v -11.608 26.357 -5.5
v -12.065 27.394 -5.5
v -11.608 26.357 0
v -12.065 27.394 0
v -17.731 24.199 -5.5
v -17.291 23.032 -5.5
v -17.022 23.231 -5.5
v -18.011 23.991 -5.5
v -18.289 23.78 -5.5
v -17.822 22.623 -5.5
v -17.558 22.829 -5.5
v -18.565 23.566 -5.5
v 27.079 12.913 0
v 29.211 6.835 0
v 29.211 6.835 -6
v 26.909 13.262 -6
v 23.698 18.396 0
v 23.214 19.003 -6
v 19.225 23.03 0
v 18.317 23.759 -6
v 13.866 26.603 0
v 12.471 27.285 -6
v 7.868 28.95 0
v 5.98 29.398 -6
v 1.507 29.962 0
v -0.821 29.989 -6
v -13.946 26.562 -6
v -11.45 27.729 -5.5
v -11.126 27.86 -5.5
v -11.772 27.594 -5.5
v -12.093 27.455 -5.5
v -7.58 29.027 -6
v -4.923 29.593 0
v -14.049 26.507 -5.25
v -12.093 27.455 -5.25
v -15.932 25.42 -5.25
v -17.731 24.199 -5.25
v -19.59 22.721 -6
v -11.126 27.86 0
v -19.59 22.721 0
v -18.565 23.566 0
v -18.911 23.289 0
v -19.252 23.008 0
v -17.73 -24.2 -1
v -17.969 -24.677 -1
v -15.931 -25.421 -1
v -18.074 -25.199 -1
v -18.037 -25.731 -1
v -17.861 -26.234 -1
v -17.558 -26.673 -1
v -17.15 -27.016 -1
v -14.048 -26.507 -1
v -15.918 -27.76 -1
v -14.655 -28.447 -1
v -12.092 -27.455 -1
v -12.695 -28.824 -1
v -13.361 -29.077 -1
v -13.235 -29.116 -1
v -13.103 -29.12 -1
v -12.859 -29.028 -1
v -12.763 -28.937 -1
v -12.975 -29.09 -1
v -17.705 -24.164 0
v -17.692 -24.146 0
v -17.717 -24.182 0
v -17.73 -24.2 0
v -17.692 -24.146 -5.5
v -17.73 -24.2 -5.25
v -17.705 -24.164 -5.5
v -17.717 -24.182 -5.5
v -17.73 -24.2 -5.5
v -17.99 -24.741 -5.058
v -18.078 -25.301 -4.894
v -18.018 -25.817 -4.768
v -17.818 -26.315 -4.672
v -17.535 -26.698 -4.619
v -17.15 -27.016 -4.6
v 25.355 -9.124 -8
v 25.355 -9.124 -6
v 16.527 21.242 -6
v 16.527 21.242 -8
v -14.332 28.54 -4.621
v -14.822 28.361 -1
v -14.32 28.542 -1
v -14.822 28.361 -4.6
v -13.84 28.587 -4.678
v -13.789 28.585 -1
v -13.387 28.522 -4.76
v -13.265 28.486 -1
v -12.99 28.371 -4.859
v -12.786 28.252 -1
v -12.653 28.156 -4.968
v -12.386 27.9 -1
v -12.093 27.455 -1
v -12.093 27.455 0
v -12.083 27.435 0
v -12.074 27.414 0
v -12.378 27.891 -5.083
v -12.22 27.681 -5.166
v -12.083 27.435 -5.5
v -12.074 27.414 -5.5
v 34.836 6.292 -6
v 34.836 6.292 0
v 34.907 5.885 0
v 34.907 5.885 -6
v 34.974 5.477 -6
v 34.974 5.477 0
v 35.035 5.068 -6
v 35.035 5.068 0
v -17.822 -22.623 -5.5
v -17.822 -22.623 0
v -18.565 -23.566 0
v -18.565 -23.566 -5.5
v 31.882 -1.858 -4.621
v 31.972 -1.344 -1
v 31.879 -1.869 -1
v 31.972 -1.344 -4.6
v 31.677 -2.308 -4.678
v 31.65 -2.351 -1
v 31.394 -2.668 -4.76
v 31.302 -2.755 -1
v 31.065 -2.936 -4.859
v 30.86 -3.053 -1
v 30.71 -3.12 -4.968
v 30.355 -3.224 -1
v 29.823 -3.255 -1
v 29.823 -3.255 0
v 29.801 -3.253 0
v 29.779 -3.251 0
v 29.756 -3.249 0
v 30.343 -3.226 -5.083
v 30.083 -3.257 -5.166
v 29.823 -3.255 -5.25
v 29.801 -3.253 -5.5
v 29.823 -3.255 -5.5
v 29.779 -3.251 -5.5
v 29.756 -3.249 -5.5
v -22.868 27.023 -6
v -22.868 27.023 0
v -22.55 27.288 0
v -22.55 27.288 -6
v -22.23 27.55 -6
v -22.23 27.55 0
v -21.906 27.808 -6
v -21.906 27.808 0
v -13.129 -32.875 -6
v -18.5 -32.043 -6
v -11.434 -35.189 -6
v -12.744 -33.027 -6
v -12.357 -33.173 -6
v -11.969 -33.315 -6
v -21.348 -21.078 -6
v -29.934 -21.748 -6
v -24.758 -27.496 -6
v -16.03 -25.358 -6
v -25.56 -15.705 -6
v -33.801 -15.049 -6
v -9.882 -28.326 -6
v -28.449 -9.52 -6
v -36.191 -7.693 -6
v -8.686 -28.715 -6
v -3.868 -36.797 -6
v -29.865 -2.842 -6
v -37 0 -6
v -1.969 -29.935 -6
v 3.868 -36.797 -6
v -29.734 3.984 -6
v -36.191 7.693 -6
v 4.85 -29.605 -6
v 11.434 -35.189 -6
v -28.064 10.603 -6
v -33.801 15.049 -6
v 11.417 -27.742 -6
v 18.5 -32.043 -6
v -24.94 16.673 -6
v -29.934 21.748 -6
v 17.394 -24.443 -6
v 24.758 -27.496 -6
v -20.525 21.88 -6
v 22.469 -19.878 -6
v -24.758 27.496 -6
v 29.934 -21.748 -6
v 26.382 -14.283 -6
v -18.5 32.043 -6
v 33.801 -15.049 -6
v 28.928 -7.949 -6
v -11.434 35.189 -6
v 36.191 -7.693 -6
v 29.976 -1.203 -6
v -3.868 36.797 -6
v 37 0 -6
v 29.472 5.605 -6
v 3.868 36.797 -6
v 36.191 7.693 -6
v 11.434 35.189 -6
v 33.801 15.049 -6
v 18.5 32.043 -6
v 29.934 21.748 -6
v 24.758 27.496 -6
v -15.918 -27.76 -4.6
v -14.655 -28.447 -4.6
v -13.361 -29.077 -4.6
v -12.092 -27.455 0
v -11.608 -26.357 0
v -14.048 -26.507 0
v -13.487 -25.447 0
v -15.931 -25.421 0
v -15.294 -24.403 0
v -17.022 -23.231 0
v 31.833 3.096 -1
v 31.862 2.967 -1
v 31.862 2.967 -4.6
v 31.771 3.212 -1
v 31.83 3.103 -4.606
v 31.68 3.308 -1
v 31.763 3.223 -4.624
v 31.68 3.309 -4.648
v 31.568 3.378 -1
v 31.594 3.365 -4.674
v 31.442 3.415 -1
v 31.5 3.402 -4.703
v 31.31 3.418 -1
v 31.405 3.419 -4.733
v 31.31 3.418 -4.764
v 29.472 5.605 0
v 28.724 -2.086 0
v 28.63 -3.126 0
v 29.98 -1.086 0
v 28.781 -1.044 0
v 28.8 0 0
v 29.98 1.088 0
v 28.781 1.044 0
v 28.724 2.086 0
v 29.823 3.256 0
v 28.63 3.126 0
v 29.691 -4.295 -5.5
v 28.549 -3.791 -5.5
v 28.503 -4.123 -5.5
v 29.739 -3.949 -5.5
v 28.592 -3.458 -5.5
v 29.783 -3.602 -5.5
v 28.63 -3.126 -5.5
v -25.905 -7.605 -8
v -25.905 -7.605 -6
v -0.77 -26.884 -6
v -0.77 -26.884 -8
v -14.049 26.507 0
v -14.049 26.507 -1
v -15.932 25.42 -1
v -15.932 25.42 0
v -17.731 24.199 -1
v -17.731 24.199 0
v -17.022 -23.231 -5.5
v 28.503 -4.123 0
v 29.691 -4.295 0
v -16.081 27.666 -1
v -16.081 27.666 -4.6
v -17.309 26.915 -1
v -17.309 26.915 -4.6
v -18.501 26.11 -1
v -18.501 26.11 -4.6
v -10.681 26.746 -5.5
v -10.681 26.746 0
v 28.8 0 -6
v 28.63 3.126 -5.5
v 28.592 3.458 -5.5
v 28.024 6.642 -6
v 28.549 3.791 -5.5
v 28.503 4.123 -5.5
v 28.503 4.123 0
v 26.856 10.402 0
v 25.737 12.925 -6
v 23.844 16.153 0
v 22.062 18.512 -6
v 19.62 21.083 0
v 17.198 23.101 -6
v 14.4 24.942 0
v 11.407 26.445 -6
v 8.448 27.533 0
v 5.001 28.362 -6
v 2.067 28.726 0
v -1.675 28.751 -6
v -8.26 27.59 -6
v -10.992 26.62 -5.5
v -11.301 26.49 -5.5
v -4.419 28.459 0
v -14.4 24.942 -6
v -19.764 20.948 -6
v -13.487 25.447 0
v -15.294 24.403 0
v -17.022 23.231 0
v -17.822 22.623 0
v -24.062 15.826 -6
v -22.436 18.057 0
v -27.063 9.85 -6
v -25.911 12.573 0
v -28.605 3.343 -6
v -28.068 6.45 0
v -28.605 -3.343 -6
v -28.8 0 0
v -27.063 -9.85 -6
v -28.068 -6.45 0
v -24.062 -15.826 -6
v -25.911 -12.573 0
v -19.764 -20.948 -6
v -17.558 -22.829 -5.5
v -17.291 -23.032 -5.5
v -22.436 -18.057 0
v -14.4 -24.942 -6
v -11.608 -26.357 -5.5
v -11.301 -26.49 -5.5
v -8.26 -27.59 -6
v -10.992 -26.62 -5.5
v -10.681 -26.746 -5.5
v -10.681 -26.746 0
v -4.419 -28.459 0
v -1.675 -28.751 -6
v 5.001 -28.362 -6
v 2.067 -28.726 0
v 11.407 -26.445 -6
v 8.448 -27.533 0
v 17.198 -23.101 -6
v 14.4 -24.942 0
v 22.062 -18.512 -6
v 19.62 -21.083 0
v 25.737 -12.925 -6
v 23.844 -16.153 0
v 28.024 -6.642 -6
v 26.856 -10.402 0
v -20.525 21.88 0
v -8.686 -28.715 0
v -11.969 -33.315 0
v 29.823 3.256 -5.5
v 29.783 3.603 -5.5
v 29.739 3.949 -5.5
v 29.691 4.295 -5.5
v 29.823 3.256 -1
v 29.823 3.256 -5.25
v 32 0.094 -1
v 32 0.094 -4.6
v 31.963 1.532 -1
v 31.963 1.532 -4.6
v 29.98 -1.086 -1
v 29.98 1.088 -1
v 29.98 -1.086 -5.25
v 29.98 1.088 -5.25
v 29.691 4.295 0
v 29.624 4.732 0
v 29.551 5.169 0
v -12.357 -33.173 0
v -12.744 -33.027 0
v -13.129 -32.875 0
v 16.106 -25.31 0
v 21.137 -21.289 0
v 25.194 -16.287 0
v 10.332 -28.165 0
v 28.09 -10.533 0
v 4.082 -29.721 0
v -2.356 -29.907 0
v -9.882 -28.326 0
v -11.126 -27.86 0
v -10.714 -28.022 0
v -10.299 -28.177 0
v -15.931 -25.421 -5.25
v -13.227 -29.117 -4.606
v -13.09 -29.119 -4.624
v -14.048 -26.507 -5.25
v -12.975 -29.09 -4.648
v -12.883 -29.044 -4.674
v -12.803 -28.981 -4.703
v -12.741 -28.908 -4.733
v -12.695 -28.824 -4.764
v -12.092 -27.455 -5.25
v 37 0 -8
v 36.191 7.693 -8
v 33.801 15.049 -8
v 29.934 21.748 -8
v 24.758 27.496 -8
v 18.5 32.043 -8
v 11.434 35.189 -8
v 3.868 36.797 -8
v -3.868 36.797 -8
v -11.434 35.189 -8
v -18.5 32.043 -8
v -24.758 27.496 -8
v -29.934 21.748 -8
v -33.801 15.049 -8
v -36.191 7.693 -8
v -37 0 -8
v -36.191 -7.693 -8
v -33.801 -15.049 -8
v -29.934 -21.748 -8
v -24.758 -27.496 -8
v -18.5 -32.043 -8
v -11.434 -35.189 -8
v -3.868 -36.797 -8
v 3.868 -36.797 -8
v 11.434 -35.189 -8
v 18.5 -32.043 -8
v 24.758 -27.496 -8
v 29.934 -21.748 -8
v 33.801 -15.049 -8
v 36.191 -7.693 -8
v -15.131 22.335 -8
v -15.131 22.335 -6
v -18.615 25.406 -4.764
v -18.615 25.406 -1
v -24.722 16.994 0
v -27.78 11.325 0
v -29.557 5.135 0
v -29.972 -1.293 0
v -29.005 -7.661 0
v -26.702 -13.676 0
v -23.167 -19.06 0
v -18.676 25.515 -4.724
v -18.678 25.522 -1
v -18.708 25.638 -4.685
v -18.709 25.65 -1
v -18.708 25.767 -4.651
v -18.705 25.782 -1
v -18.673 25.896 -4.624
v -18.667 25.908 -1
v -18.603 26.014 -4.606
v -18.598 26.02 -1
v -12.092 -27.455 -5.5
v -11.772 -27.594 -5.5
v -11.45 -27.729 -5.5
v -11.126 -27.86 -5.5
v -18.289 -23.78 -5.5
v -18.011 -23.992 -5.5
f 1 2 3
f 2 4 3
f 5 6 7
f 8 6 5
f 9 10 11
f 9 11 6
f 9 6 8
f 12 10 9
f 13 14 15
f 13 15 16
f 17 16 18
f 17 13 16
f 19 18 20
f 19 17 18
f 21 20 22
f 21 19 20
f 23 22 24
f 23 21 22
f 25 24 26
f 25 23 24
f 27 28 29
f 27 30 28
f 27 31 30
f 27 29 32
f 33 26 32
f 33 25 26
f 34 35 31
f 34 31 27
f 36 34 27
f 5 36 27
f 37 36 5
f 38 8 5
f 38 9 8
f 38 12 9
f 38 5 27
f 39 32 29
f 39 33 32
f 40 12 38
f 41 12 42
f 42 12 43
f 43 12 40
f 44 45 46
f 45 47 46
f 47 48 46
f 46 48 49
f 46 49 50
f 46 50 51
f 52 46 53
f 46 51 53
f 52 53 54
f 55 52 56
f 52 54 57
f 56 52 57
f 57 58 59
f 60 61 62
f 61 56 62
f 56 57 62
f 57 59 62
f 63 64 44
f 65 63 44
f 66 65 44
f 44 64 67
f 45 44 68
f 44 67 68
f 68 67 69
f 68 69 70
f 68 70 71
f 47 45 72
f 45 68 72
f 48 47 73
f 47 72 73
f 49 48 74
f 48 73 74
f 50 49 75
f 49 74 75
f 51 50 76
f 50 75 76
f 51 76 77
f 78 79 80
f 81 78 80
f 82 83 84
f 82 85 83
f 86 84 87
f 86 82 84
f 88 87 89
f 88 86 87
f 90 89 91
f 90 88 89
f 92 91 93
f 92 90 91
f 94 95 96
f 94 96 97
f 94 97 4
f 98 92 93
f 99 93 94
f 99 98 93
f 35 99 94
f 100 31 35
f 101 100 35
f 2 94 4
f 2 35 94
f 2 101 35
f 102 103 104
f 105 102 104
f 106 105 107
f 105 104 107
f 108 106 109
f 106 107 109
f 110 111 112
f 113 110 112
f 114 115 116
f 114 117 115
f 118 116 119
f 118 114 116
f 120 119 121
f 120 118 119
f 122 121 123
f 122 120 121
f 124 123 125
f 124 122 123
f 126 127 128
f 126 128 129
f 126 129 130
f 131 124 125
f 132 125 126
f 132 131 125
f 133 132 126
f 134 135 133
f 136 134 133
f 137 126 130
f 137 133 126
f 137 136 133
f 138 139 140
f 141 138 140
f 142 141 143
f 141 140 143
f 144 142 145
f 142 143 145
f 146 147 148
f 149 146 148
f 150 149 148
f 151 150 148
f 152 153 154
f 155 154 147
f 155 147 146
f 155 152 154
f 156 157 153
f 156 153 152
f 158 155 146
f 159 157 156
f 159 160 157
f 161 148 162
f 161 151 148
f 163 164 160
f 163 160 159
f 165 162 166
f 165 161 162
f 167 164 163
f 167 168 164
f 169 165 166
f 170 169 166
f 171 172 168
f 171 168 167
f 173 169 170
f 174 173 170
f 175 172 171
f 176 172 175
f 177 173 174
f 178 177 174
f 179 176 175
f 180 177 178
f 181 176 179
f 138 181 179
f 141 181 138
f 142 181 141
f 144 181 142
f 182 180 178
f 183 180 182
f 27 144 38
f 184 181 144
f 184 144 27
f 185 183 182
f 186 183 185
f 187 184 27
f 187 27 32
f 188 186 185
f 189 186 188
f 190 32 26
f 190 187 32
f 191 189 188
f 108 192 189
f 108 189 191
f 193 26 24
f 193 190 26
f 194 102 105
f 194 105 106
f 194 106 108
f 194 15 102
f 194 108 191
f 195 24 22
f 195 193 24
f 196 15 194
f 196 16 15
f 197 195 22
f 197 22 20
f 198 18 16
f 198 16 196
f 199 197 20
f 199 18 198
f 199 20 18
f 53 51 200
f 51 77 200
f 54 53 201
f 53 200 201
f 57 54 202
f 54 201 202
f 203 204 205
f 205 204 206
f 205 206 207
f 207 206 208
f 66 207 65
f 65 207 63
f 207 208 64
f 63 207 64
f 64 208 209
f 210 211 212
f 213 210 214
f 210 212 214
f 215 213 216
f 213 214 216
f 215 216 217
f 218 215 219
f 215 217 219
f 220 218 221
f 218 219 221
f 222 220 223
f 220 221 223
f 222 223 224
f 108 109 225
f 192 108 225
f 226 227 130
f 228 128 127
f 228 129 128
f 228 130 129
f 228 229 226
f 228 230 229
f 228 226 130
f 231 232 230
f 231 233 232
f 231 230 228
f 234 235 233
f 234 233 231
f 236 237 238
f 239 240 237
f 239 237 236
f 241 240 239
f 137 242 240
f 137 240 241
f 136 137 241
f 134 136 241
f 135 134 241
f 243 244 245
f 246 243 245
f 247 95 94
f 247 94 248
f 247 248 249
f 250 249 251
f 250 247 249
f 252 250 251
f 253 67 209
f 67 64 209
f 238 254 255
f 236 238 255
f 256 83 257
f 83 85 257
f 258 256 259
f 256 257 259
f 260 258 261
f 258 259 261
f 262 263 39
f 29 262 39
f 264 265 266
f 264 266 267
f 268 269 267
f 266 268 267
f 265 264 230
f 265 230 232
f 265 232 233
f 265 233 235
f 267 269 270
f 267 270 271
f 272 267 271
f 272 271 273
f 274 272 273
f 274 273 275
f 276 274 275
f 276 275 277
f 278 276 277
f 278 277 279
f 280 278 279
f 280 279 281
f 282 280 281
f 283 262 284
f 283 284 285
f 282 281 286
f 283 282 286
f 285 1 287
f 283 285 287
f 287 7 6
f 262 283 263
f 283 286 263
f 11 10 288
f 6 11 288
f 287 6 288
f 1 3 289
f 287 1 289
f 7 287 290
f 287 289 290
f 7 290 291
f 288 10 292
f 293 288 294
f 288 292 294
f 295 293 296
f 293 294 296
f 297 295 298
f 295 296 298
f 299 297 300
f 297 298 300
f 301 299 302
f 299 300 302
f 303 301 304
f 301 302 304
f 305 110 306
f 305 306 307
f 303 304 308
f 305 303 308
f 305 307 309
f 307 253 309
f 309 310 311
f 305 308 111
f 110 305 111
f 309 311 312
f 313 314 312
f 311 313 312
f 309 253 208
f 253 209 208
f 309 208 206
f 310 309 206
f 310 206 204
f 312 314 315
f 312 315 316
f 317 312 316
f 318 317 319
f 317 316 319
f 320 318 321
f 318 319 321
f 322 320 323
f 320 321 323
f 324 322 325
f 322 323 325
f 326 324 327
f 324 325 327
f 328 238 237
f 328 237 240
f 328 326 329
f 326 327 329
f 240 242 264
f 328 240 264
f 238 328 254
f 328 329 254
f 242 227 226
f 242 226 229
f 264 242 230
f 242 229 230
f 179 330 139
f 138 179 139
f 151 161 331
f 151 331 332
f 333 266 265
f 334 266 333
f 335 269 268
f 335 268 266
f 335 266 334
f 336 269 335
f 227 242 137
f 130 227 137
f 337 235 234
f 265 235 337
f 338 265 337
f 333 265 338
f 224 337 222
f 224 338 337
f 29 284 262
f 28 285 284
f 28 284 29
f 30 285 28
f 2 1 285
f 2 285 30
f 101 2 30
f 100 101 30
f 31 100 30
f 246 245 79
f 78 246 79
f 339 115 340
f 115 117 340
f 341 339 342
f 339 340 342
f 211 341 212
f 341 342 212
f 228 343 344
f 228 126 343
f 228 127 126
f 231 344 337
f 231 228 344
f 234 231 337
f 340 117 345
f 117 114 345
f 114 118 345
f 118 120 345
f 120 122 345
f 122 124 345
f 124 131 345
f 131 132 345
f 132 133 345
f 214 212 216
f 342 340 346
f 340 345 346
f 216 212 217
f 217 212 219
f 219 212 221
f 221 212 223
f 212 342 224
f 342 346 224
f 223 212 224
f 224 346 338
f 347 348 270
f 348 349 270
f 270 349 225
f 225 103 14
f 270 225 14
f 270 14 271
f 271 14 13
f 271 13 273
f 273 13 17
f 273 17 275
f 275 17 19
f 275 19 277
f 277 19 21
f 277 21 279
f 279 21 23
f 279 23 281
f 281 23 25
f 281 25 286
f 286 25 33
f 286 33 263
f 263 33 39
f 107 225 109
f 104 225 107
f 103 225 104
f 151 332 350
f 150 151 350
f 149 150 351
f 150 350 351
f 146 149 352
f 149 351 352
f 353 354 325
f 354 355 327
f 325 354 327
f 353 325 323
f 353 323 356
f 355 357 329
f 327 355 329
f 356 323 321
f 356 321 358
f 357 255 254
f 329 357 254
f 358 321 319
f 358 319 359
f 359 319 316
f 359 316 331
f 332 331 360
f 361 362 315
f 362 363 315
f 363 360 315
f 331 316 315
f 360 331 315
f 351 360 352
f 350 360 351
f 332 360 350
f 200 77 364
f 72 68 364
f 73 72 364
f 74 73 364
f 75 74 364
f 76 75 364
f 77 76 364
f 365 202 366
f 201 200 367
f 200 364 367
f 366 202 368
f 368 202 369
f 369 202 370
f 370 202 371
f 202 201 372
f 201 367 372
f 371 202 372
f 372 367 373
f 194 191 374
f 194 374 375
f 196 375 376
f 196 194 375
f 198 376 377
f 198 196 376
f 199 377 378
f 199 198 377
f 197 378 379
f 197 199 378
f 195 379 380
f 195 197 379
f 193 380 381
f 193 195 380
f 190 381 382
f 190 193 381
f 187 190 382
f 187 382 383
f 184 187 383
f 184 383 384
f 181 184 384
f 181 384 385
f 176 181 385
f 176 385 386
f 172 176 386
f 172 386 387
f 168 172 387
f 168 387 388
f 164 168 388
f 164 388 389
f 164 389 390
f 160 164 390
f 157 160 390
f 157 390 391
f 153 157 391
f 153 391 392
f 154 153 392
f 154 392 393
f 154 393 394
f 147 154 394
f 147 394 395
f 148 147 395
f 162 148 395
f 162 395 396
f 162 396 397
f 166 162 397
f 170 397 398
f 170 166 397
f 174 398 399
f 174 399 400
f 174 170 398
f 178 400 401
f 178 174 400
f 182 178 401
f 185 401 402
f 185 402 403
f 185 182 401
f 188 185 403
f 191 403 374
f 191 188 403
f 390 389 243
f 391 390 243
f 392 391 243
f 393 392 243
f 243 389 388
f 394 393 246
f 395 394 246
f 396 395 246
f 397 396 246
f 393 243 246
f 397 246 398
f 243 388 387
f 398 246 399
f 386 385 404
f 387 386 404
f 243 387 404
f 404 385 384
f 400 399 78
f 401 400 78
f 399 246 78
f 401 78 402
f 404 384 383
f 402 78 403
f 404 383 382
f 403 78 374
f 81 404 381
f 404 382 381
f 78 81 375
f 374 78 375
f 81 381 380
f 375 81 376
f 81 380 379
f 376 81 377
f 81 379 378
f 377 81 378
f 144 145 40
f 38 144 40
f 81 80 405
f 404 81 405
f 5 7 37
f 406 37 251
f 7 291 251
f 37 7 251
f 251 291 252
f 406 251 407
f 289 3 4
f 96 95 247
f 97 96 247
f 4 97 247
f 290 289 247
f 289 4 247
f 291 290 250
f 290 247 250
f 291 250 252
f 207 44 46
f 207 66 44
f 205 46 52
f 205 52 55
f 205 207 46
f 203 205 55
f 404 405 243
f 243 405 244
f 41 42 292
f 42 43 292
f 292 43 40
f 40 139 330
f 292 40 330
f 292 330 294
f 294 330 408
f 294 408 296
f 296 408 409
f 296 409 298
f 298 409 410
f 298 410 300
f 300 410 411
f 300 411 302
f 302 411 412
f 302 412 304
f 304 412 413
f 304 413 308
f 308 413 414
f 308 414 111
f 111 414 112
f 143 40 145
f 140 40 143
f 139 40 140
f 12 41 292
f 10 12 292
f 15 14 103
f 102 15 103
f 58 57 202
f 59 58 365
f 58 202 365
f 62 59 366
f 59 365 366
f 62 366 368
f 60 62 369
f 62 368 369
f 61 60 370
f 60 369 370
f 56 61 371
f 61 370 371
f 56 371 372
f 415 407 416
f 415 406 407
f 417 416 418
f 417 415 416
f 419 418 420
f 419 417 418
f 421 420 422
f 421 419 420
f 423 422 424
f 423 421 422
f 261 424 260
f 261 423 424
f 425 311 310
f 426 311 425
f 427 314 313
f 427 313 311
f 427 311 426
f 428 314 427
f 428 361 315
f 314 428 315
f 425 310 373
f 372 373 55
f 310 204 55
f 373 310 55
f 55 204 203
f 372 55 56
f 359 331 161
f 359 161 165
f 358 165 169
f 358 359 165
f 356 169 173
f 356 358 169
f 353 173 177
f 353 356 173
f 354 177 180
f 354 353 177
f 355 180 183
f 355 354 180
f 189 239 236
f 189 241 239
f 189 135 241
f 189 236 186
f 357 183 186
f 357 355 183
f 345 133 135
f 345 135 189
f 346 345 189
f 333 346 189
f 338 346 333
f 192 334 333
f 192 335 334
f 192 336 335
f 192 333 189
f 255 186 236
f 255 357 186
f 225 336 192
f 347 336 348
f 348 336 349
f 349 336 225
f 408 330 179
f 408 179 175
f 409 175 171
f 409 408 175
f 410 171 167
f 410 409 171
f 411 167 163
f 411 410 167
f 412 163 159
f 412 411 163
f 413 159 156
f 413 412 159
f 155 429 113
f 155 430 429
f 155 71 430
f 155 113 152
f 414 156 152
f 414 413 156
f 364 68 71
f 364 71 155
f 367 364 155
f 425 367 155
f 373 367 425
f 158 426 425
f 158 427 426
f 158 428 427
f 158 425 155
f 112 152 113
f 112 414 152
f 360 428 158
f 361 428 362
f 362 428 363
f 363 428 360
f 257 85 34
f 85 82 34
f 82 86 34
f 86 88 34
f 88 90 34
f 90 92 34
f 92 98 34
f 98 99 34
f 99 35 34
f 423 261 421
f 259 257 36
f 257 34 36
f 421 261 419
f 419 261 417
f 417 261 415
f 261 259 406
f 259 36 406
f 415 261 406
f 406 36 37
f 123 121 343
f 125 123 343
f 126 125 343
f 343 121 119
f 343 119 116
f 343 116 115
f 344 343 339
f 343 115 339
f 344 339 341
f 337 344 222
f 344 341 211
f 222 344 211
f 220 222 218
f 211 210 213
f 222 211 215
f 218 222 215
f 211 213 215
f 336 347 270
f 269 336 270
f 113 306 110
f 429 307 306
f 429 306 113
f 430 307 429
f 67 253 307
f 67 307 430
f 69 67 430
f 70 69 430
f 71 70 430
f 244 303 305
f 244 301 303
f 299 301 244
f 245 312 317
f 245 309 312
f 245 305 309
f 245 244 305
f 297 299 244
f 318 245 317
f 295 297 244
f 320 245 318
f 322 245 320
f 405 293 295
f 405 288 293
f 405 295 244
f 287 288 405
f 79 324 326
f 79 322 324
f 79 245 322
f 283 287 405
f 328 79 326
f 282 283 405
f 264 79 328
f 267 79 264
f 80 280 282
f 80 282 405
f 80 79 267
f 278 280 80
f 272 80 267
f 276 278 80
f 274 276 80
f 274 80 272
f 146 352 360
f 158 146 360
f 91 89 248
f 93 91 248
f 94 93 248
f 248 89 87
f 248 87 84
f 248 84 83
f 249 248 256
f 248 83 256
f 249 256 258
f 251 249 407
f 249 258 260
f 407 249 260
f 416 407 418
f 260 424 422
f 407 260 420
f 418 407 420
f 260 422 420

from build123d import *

# Parameters (mm, degrees)
SKETCH55_R               = 37
BOSS_EXTRUDE17_DEPTH     = 8
SKETCH56_R               = 37
SKETCH56_R_2             = 30
SKETCH56_R_3             = 28.8
CUT_EXTRUDE20_DEPTH      = 6
CUT_EXTRUDE21_DEPTH      = 5.5
FILLET1_R                = 0.5
FILLET2_R                = 2
BOSS_EXTRUDE18_START     = 6
BOSS_EXTRUDE18_DEPTH     = 6
CIRPATTERN1_COUNT        = 3
FILLET1_OF_CIRPATTERN1_R = 0.5
FILLET2_OF_CIRPATTERN1_R = 2


with BuildPart() as part:
    # Sketch55 → Boss-Extrude17 (new body)
    with BuildSketch(Plane.XY):
        Circle(SKETCH55_R)
        Polygon((-15.131119551888249, 22.33533974306702), (-25.90504070234881, -7.604599443277265), (-0.7697350404796751, -26.883764916532357), (25.354620105449243, -9.123888866834614), (16.52740298769779, 21.24243055544057), align=None, mode=Mode.SUBTRACT)
    extrude(amount=-BOSS_EXTRUDE17_DEPTH)

    # Sketch56 → Cut-Extrude20 (cut)
    # profile 1 of 2: a face of its own
    with BuildSketch(Plane.XY):
        Circle(SKETCH56_R)
        Circle(SKETCH56_R_2, mode=Mode.SUBTRACT)
    # profile 2 of 2: a face of its own
    with BuildSketch(Plane.XY):
        Circle(SKETCH56_R_3)
    extrude(amount=-CUT_EXTRUDE20_DEPTH, mode=Mode.SUBTRACT)

    # Sweep1: sweep along a path in Sketch58
    with BuildLine(Plane.XY.offset(-1)) as sweep1_path:
        ThreePointArc((32.05951496825865, -3.5), (32.25, 0), (32.05951496825865, 3.5))
    # Sketch59 → Sweep1 (sweep)
    with BuildSketch(Plane(origin=(0, 0, 0), x_dir=(1, 0, 0), z_dir=(0, 1, 0))):
        Polygon((32, 1.0000000000000009), (32, 4.6), (30, 5.25), (30, 1.0000000000000009), align=None)
    sweep1 = sweep(path=sweep1_path.line)

    # Sketch60 → Cut-Extrude21 (cut)
    with BuildSketch(Plane.XY):
        with BuildLine():
            Line((29.691011106511933, 4.294631471149185), (28.503370662251456, 4.122846212303217))
            ThreePointArc((28.503370662251456, 4.122846212303217), (28.570983048615947, 3.624765873225473), (28.629892436770504, 3.125581395348848))
            Line((28.629892436770504, 3.125581395348848), (29.822804621635946, 3.255813953488383))
            ThreePointArc((29.822804621635946, 3.255813953488383), (29.761440675641612, 3.7757977846098676), (29.691011106511933, 4.294631471149185))
        make_face()
        with BuildLine():
            Line((29.822804621635946, -3.255813953488384), (28.629892436770504, -3.1255813953488487))
            ThreePointArc((28.629892436770504, -3.1255813953488487), (28.57098304861595, -3.6247658732254733), (28.503370662251456, -4.122846212303217))
            Line((28.503370662251456, -4.122846212303217), (29.691011106511933, -4.294631471149185))
            ThreePointArc((29.691011106511933, -4.294631471149185), (29.761440675641612, -3.7757977846098676), (29.822804621635946, -3.255813953488384))
        make_face()
    cut_extrude21 = extrude(amount=-CUT_EXTRUDE21_DEPTH, mode=Mode.SUBTRACT)

    # Fillet1
    fillet1_edges = [part.edges().sort_by_distance(p)[0] for p in [
        (31.810991596411686, 3.472868217054266, -2.8000000000000003),
    ]]
    fillet(fillet1_edges, radius=FILLET1_R)

    # Fillet2
    fillet2_edges = [part.edges().sort_by_distance(p)[0] for p in [
        (31.810991596411686, -3.4728682170542657, -2.8000000000000003),
    ]]
    fillet(fillet2_edges, radius=FILLET2_R)

    # Sketch62 → Boss-Extrude18 (add)
    with BuildSketch(Plane.XY.offset(-6).offset(BOSS_EXTRUDE18_START)):
        with BuildLine():
            Line((35.035393105684086, 5.067665135956038), (28.225251300389694, 5.724961923877751))
            ThreePointArc((28.225251300389694, 5.724961923877751), (28.092883468127496, 6.342704348005581), (27.946997326196957, 6.957394659607891))
            Line((27.946997326196957, 6.957394659607891), (34.836258824834346, 6.29246144915893))
            ThreePointArc((34.836258824834346, 6.29246144915893), (34.94119298731927, 5.680935893223171), (35.035393105684086, 5.067665135956038))
        make_face()
    boss_extrude18 = extrude(amount=-BOSS_EXTRUDE18_DEPTH)

    # CirPattern1: Sweep1, Cut-Extrude21, Boss-Extrude18 ×3 about axis
    cirpattern1_axis = Axis((-3.9e-16, -9.2e-16, 0), (0, 0, 1))
    add([sweep1.rotate(cirpattern1_axis, i * 360 / CIRPATTERN1_COUNT) for i in range(1, CIRPATTERN1_COUNT)])
    add([cut_extrude21.rotate(cirpattern1_axis, i * 360 / CIRPATTERN1_COUNT) for i in range(1, CIRPATTERN1_COUNT)], mode=Mode.SUBTRACT)
    add([boss_extrude18.rotate(cirpattern1_axis, i * 360 / CIRPATTERN1_COUNT) for i in range(1, CIRPATTERN1_COUNT)])

    # Fillet1 of CirPattern1
    fillet1_of_cirpattern1_edges = [part.edges().sort_by_distance(p)[0] for p in [
        (-18.9130878981704, 25.812692733538686, -2.8000000000000003),
        (-12.897903698241294, -29.28556095059294, -2.8000000000000003),
    ]]
    fillet(fillet1_of_cirpattern1_edges, radius=FILLET1_OF_CIRPATTERN1_R)

    # Fillet2 of CirPattern1
    fillet2_of_cirpattern1_edges = [part.edges().sort_by_distance(p)[0] for p in [
        (-12.897903698241274, 29.28556095059295, -2.8000000000000003),
        (-18.91308789817042, -25.81269273353867, -2.8000000000000003),
    ]]
    fillet(fillet2_of_cirpattern1_edges, radius=FILLET2_OF_CIRPATTERN1_R)


solid = part.part
